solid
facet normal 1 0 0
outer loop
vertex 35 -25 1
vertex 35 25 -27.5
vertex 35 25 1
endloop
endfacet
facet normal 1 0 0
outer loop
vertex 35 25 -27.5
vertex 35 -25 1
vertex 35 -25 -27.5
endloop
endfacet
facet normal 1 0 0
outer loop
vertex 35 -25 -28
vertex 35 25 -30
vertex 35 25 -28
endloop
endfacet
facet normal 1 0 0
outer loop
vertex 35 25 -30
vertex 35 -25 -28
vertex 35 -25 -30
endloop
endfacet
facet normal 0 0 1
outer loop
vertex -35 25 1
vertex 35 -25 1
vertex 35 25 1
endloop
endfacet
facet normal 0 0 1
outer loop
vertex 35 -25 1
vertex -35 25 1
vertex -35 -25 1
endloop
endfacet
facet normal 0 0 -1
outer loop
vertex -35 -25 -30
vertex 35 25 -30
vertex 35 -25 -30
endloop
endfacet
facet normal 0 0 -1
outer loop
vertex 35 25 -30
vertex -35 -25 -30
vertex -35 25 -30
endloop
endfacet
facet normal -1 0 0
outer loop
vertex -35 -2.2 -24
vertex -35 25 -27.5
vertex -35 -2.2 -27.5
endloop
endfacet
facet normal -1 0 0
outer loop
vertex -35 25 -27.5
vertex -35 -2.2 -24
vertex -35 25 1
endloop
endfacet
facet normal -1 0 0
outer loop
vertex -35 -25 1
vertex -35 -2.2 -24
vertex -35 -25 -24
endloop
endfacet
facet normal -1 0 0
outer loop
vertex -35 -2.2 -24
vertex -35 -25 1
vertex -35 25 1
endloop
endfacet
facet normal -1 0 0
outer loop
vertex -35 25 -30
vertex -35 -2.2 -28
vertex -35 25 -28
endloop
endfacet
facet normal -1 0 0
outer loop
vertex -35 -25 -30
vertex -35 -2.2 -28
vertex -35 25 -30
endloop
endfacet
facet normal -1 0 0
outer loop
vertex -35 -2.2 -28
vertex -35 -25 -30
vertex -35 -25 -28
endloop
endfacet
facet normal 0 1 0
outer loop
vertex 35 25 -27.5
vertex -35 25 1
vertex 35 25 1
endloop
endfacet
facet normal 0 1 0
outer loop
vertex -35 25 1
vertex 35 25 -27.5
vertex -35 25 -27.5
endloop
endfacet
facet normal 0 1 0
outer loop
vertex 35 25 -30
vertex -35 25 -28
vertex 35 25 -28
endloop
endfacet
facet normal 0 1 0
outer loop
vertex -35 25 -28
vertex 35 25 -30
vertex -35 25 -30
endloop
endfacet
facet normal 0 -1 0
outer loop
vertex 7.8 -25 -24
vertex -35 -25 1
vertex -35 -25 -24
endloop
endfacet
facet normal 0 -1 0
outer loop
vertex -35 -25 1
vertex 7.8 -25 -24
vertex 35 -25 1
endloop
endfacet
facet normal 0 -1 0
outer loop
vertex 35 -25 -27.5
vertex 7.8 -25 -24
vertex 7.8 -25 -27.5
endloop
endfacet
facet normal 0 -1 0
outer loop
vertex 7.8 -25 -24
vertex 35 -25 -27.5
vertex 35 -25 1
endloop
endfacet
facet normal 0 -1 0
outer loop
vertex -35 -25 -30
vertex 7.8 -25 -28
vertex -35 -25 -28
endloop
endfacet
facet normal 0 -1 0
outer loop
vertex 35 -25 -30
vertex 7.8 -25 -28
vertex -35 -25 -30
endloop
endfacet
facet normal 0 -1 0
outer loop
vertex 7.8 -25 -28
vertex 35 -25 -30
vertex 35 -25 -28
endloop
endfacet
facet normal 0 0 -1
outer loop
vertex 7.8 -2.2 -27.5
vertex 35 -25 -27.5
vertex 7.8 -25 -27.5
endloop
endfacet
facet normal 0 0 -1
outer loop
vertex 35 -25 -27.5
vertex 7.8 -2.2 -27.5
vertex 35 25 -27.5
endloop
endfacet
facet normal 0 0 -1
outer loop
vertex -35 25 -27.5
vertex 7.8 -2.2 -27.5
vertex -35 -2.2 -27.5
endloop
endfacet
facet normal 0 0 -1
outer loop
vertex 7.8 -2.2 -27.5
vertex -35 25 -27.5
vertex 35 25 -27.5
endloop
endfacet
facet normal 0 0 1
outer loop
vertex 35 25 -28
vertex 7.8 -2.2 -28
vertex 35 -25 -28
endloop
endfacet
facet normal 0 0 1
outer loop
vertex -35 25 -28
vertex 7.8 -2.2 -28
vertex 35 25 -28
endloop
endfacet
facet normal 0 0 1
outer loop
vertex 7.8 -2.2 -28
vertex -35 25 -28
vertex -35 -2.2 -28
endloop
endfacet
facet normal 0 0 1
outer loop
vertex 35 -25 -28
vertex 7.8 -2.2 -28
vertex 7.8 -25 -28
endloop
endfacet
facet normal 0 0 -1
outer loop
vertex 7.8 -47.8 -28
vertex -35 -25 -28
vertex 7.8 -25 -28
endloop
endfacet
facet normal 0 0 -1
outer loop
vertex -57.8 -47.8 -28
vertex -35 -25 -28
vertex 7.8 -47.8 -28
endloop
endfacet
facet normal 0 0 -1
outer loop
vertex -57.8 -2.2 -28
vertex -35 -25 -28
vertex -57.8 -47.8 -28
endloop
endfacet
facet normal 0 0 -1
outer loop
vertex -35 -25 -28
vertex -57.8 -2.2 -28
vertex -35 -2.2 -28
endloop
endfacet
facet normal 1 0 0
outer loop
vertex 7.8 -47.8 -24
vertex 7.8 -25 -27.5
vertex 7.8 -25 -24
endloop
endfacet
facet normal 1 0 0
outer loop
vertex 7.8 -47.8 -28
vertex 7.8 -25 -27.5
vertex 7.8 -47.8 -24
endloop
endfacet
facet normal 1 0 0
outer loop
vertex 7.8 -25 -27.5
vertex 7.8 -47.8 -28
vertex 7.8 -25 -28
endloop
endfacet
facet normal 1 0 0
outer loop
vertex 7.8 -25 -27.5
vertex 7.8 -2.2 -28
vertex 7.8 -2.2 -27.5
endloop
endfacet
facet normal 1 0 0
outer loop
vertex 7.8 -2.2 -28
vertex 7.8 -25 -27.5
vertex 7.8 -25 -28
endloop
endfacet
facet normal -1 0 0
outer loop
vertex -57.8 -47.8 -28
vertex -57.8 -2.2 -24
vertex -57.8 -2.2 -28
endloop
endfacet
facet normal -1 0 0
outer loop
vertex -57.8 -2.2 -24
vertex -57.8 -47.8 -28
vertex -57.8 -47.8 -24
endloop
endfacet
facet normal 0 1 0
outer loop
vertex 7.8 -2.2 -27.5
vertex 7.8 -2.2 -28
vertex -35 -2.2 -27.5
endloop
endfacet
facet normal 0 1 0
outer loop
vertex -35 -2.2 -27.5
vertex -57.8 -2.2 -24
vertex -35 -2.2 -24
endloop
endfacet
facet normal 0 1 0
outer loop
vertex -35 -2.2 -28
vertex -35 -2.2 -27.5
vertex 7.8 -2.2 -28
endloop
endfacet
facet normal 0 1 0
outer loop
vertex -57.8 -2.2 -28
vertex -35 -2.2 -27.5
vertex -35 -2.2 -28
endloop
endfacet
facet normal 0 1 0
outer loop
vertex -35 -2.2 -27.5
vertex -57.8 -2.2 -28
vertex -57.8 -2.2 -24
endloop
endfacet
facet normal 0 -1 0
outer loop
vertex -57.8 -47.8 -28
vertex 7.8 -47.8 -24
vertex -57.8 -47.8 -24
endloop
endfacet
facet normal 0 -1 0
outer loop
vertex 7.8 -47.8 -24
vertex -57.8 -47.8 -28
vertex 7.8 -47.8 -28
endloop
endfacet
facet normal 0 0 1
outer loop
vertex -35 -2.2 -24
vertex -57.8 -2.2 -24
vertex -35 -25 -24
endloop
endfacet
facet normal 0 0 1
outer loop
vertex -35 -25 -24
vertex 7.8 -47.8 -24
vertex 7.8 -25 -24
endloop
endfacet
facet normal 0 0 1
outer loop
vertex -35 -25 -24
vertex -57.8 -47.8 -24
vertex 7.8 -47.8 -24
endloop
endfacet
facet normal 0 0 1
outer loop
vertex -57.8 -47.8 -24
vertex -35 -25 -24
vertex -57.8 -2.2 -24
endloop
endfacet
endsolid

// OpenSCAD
// Two-part enclosure for a small electronics board
// Print orientation: box on the bed (z = 0), lid on top, side by side along X

// ---------------- Parameters ----------------
box_x      = 70;    // box outer length (X)
box_y      = 50;    // box outer width (Y)
box_z      = 30;    // box outer height (Z)
box_wall   = 2;     // box wall thickness
box_floor  = 2;     // box floor thickness

lip_x      = 65.6;  // lid lip outer length (X)
lip_y      = 45.6;  // lid lip outer width (Y)
lip_t      = 1.5;   // lid lip thickness
lip_h      = 4;     // lid lip height (from plate top)

gap        = 10;    // gap between box and lid
eps        = 0.5;   // cutter overshoot past faces

$fn = 64;

// ---------------- Derived ----------------
box_x0 = -box_x / 2;
box_y0 = -box_y / 2;
box_z0 = -box_z;                    // outer bottom (z = -30)
floor_z = box_z0 + box_floor;       // z = -28

lip_x0 = -lip_x / 2;
lip_y0 = -lip_y / 2;
lip_top_z = floor_z + lip_t;        // z = -26.5

// ---------------- Model ----------------
union() {
    // Box: open-top, walls on all sides
    difference() {
        translate([box_x0, box_y0, box_z0])
            cube([box_x, box_y, box_z + 1]);   // extends past top face
        translate([box_x0, box_y0, floor_z])
            cube([box_x, box_y, eps]);        // floor cutter
    }

    // Lid: plate with a rectangular lip on top, centred on the box
    translate([box_x0 + gap, box_y0, floor_z]) {
        // Plate
        translate([-lip_x / 2, -lip_y / 2, 0])
            cube([lip_x, lip_y, lip_t]);

        // Lip (overhangs the plate; would need supports if printed this way)
        translate([-lip_x / 2, -lip_y / 2, 0])
            cube([lip_x, lip_y, lip_h]);
    }
}
